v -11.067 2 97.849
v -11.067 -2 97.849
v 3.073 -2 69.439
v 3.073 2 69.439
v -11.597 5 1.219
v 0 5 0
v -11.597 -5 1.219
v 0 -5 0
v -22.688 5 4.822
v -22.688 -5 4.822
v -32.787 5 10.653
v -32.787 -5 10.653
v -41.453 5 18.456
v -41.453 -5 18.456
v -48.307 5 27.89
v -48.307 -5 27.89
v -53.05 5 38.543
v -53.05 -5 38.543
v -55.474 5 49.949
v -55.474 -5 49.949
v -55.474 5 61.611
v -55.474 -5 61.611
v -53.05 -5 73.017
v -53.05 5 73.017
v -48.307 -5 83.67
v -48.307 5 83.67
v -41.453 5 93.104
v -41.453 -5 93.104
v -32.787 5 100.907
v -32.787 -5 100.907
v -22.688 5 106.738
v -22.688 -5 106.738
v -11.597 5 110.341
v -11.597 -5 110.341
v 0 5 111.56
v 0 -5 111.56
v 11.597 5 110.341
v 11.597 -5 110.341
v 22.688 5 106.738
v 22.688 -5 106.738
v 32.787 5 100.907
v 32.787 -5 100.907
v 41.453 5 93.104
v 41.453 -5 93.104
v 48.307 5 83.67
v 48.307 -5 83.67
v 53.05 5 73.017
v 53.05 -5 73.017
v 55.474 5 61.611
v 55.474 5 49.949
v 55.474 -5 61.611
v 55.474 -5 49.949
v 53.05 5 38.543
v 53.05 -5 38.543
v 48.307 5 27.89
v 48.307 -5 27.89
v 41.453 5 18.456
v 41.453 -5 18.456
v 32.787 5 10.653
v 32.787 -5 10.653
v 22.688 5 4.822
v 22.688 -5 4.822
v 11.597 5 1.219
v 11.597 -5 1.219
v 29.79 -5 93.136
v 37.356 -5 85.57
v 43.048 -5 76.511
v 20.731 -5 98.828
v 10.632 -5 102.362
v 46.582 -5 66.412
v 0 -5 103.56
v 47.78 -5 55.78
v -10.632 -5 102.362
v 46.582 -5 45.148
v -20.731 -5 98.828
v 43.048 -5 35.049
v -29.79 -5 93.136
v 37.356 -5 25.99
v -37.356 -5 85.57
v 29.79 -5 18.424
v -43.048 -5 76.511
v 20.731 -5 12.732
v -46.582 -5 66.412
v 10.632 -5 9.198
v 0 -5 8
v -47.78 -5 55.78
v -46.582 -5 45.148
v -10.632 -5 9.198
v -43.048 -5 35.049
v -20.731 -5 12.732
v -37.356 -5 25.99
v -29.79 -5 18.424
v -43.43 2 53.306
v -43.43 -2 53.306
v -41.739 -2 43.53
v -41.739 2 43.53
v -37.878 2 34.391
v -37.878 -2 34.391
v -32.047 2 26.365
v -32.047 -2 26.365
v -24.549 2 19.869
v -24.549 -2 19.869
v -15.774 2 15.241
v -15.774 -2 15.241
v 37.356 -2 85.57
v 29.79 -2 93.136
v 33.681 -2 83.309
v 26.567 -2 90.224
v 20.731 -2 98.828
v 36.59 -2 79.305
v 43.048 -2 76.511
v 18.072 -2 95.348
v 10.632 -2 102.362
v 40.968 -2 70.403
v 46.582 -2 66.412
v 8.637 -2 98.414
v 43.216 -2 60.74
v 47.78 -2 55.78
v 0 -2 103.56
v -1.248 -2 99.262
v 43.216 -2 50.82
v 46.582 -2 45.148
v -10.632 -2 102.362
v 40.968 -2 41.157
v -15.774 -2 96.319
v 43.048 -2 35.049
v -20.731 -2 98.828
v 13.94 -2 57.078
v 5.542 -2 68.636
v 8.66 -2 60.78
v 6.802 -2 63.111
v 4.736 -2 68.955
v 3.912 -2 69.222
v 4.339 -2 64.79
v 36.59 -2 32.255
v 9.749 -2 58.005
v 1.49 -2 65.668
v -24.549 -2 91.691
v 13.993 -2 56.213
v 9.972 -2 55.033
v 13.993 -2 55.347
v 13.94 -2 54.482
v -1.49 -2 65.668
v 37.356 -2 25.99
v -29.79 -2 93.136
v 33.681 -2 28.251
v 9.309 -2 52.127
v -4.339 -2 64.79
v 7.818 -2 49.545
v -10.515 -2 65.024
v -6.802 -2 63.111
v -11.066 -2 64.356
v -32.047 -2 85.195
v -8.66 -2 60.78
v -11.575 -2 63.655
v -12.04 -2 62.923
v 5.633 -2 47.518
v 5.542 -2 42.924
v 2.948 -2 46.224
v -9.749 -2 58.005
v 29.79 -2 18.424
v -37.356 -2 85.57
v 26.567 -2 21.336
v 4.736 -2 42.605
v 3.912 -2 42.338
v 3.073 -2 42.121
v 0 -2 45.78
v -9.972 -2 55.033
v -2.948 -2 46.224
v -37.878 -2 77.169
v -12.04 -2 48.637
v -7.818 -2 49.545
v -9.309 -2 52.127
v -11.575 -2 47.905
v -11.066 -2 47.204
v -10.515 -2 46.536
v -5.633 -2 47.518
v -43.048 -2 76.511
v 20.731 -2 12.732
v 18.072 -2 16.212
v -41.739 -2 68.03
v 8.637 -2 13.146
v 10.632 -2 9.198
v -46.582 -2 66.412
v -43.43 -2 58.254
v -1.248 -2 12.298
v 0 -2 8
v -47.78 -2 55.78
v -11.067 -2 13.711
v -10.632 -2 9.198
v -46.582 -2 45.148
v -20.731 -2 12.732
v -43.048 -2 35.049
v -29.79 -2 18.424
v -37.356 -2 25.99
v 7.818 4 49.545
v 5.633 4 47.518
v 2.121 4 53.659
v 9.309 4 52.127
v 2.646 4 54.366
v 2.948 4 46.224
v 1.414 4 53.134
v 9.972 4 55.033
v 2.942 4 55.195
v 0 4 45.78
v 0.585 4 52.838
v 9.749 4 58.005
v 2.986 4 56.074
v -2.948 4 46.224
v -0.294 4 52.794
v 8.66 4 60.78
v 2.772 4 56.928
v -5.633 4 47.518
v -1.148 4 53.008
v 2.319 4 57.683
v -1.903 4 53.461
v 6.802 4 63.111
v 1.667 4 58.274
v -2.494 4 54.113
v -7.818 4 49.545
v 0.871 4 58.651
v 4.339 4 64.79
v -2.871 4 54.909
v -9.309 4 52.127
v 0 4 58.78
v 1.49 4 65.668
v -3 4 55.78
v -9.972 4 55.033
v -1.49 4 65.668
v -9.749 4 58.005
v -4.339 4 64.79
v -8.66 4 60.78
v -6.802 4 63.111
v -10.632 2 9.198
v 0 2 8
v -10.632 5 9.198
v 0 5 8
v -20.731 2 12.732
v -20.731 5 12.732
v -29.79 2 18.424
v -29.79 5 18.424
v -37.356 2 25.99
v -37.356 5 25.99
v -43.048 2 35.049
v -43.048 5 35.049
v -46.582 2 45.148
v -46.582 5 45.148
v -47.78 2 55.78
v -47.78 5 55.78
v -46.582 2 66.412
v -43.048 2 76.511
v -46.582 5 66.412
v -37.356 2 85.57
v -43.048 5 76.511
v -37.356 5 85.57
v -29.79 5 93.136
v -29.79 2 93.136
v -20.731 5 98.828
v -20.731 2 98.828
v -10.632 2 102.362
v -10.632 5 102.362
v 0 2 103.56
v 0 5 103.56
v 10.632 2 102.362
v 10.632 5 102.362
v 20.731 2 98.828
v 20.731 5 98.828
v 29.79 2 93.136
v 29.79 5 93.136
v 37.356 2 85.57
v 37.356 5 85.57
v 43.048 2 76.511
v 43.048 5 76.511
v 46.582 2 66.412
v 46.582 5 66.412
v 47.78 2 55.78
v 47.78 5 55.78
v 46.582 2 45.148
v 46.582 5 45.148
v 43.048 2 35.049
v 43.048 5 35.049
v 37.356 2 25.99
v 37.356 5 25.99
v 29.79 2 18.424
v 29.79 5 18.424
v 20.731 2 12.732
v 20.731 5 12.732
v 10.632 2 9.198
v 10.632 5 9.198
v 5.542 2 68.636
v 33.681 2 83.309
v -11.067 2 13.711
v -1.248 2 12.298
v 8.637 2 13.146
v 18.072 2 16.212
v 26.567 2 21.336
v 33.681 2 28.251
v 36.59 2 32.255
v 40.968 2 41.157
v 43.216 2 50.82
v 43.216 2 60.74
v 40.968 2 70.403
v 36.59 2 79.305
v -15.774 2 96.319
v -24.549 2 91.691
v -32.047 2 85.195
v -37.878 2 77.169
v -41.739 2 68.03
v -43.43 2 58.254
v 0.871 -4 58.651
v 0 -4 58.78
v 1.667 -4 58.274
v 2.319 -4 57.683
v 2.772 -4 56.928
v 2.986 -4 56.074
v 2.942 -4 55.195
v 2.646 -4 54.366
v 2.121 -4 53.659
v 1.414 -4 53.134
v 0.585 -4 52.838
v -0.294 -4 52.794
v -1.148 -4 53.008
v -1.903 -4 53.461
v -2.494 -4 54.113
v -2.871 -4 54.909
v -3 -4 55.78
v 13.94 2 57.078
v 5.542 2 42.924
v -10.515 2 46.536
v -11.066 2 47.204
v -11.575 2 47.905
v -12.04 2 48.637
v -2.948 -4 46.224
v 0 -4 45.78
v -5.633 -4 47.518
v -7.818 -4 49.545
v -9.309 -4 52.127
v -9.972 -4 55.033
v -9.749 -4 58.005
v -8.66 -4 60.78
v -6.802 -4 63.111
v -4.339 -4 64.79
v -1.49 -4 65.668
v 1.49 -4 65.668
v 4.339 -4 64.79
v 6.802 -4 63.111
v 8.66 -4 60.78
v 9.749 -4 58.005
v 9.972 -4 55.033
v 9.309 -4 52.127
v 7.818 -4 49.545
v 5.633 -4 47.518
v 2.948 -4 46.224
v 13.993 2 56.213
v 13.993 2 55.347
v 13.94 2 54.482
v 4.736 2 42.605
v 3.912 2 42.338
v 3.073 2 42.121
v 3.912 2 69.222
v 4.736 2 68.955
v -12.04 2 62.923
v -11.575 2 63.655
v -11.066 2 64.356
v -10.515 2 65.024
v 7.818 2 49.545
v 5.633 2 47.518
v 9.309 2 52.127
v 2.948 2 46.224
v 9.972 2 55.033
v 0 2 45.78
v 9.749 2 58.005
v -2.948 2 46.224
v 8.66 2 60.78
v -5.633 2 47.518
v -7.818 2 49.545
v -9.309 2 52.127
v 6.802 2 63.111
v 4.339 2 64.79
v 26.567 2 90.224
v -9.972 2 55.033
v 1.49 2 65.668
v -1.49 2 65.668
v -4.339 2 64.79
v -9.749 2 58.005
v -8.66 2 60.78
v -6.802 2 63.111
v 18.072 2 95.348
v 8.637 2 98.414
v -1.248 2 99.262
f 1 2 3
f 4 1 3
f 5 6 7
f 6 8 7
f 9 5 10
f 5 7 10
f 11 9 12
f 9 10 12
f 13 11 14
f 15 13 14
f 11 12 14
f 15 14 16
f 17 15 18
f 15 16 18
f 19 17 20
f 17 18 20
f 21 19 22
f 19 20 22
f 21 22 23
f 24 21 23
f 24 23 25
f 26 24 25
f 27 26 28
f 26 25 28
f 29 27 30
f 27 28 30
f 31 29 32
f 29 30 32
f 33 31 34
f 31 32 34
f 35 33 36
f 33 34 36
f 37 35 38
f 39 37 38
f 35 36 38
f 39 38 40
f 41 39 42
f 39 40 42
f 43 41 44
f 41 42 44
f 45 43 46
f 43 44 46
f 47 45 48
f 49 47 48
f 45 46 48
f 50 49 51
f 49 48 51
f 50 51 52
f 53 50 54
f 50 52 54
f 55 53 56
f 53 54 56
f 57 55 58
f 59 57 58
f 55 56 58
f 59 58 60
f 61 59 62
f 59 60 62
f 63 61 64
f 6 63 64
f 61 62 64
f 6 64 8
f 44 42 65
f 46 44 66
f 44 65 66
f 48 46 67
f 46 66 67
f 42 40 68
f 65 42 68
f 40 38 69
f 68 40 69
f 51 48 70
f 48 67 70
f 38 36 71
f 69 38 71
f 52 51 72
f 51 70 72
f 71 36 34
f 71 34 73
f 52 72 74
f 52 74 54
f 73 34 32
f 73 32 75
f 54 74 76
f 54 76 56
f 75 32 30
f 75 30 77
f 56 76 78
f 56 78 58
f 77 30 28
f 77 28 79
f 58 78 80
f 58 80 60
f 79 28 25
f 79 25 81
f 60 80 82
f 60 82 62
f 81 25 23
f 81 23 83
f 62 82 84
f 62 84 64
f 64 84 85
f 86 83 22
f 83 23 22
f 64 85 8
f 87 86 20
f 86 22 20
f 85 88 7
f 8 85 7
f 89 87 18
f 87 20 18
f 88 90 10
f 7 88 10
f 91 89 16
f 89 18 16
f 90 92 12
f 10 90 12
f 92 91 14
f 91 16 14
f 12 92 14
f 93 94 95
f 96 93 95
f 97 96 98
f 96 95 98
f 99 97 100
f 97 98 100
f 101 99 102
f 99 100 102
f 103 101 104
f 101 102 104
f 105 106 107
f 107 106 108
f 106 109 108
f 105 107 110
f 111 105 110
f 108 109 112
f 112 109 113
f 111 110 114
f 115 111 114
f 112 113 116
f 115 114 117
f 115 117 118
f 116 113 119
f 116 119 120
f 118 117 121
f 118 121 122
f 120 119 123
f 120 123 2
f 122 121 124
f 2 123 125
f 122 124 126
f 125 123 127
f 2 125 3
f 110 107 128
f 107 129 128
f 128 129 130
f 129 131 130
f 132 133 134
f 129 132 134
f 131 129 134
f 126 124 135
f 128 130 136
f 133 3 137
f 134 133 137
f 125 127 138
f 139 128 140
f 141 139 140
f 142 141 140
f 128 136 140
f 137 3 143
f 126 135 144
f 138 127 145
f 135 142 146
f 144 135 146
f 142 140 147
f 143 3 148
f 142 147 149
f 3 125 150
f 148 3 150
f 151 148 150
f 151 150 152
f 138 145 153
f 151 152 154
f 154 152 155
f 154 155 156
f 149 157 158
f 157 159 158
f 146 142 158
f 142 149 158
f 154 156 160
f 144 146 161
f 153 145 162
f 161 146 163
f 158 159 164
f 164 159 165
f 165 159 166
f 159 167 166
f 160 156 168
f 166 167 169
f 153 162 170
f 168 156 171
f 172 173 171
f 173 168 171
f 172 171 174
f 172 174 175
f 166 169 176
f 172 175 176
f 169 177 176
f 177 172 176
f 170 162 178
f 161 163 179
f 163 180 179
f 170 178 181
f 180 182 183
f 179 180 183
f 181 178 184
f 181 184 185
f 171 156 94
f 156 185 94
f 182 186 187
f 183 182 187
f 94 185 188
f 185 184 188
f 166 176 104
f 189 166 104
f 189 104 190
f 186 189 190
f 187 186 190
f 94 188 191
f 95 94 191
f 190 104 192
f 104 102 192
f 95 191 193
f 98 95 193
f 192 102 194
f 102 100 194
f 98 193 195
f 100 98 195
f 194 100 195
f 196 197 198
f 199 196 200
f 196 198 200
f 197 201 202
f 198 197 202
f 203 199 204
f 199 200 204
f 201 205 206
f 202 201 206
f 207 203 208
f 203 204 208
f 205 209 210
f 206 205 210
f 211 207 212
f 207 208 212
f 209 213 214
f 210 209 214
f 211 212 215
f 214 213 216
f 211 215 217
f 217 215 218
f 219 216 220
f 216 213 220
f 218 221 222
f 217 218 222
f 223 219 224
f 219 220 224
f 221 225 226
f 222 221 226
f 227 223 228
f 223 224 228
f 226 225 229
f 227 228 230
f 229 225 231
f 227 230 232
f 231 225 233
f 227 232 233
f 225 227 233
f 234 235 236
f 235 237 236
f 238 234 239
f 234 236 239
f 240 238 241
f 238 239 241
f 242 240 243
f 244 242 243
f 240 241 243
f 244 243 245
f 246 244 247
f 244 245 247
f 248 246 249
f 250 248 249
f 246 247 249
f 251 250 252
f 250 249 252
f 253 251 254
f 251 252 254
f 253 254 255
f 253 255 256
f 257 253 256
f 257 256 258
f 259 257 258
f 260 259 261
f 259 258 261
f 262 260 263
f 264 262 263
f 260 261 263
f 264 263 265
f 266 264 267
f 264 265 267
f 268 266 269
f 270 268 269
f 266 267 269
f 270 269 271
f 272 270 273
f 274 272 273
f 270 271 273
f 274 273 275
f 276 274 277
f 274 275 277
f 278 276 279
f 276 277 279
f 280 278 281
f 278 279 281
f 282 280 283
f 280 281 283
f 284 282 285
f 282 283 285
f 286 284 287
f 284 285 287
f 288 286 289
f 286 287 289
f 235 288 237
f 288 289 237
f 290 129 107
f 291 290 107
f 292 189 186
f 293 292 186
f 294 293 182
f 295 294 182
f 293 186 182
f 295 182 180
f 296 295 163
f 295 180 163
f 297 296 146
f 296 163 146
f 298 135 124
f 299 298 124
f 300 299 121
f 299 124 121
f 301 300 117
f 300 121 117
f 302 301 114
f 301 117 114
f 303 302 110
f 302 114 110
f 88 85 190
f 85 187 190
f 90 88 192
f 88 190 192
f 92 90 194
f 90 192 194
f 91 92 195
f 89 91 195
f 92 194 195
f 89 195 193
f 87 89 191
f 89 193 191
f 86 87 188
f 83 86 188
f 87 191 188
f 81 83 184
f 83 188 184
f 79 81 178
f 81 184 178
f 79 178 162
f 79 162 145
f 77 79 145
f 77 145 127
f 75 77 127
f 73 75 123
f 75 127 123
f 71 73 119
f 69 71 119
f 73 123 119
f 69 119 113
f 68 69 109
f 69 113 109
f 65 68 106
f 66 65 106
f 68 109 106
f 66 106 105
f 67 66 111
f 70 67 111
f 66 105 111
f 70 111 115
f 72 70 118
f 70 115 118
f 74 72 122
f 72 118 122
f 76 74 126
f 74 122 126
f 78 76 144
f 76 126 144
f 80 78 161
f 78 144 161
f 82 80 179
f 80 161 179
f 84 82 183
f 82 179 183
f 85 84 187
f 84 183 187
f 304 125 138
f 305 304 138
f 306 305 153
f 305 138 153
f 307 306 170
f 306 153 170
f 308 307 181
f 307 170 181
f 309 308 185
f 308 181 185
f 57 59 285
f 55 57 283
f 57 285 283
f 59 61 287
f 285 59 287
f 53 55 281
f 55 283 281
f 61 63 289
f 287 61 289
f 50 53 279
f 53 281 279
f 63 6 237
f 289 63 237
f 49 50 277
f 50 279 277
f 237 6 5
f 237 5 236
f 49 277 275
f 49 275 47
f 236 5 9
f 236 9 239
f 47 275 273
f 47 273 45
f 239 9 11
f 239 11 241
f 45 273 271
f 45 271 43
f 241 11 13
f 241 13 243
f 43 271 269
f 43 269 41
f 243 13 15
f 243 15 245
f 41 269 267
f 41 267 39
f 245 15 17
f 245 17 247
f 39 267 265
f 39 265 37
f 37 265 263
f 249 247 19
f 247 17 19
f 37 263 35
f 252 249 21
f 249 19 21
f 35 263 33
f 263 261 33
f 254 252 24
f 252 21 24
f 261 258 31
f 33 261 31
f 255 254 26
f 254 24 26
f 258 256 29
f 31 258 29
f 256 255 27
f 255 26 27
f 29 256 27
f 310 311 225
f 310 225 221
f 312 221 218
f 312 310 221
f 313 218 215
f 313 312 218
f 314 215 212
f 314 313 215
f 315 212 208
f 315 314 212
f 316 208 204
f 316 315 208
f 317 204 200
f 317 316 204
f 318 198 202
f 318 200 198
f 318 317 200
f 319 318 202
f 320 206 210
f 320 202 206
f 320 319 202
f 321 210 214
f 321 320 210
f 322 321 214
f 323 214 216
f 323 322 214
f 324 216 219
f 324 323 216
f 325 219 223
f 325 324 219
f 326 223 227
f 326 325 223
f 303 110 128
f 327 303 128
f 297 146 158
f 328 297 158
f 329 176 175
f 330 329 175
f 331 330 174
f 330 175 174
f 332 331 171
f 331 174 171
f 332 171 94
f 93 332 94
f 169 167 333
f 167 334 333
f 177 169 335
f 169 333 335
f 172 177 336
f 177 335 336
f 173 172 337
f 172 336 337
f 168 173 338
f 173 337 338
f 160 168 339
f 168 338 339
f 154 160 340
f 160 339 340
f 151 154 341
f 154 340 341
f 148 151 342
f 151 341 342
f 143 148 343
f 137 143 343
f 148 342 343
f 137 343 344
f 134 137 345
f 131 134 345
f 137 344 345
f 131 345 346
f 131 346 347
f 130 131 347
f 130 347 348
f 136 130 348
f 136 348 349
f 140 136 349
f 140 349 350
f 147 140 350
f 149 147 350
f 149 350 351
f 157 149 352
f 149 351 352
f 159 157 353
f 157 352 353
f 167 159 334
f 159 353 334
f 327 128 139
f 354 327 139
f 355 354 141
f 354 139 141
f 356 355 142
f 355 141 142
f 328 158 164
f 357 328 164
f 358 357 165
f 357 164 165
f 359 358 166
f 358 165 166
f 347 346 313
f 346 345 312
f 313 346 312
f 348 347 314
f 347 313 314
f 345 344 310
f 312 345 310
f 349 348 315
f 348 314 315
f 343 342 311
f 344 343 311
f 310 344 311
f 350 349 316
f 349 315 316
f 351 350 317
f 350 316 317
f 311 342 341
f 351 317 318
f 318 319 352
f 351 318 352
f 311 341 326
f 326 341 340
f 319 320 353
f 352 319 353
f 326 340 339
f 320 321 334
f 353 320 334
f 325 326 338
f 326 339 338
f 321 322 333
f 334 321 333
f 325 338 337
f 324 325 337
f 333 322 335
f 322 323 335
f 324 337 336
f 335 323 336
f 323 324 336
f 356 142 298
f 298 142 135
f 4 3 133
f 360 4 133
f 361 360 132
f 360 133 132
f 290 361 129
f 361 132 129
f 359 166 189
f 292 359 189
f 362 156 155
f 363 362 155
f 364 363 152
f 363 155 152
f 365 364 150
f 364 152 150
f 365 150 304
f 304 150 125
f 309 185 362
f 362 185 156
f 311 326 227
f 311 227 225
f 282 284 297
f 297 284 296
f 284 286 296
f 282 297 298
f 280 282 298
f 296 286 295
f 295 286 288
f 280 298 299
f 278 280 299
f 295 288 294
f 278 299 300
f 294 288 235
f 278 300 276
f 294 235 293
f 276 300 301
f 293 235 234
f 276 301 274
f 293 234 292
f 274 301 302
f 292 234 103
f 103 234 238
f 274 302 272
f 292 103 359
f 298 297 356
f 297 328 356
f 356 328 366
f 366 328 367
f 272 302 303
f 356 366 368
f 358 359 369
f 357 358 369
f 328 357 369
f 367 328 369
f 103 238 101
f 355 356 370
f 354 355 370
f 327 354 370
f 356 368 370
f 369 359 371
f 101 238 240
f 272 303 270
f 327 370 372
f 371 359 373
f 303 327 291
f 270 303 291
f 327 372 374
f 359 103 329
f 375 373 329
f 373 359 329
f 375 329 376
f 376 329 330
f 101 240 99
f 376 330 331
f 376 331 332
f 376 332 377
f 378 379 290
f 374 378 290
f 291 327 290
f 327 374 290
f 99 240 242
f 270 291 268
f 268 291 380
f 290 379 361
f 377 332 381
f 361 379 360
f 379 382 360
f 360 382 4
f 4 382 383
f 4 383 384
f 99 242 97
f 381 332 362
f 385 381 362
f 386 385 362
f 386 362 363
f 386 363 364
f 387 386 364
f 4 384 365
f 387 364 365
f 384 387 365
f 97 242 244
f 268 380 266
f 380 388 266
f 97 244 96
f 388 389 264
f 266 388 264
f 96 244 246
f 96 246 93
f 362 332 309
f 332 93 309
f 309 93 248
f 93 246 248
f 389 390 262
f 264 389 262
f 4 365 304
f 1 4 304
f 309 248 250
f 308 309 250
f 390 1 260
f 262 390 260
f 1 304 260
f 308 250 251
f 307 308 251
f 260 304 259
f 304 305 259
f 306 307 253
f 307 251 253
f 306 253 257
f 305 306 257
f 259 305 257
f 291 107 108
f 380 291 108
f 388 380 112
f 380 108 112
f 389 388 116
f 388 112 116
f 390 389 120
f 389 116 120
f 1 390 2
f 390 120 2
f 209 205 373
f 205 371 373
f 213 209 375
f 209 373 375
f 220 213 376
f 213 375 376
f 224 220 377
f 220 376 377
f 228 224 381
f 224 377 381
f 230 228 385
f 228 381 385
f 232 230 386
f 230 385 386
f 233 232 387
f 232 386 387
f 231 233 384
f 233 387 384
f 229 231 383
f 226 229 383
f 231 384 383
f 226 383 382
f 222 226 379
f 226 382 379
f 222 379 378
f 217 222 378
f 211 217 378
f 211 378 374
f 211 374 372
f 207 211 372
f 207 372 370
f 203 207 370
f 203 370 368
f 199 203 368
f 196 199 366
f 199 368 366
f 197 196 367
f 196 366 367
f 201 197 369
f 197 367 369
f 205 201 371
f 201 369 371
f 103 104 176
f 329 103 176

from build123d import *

# Parameters (mm, degrees)
CUT_EXTRUDE1_DEPTH = 10
CUT_EXTRUDE3_DEPTH = 10


with BuildPart() as part:
    # Sketch2 → Revolve1 (revolve)
    with BuildSketch(Plane(origin=(0, 0, 0), x_dir=(0, 0, -1), z_dir=(1, 0, 0))):
        Polygon((-55.78, -4), (-55.78, 4), (-45.78, 4), (-45.78, 2), (-8, 2), (-8, 5), (0, 5), (0, -5), (-8, -5), (-8, -2), (-45.78, -2), (-45.78, -4), align=None)
    revolve(axis=Axis((0, -4, 55.78), (0, 1, 0)))

    # Sketch5 → Cut-Extrude1 (cut)
    with BuildSketch(Plane.XZ.offset(4)):
        with BuildLine():
            Line((-3, 55.78), (0, 58.78))
            ThreePointArc((0, 58.78), (2.121320344, 53.658679656), (-3, 55.78))
        make_face()
    extrude(amount=-CUT_EXTRUDE1_DEPTH, mode=Mode.SUBTRACT)

    # Sketch6 → Cut-Extrude3 (cut)
    with BuildSketch(Plane(origin=(0, -2, 0), x_dir=(-1, 0, 0), z_dir=(0, -1, 0))):
        with BuildLine():
            Line((12.040379463, -48.636523088), (43.429568931, -53.305622821))
            ThreePointArc((43.429568931, -53.305622821), (35.192239255, -30.211341525), (15.773747398, -15.240650067))
            Line((15.773747398, -15.240650067), (10.514532139, -46.536374418))
            ThreePointArc((10.514532139, -46.536374418), (11.326237921, -47.551006468), (12.040379463, -48.636523088))
        make_face()
        with BuildLine():
            ThreePointArc((15.773747398, -96.319349933), (35.192239255, -81.348658475), (43.429568931, -58.254377179))
            Line((43.429568931, -58.254377179), (12.040379463, -62.923476912))
            ThreePointArc((12.040379463, -62.923476912), (11.326237921, -64.008993532), (10.514532139, -65.023625582))
            Line((10.514532139, -65.023625582), (15.773747398, -96.319349933))
        make_face()
        with BuildLine():
            ThreePointArc((-33.680856909, -83.30907332), (-13.442239255, -97.150958459), (11.067202318, -97.848599131))
            Line((11.067202318, -97.848599131), (-3.073168394, -69.438537111))
            ThreePointArc((-3.073168394, -69.438537111), (-4.326237921, -69.094791228), (-5.542041225, -68.636351701))
            Line((-5.542041225, -68.636351701), (-33.680856909, -83.30907332))
        make_face()
        with BuildLine():
            ThreePointArc((-36.589661739, -32.254553057), (-43.5, -55.78), (-36.589661739, -79.305446943))
            Line((-36.589661739, -79.305446943), (-13.939701983, -57.077963259))
            ThreePointArc((-13.939701983, -57.077963259), (-14, -55.78), (-13.939701983, -54.482036741))
            Line((-13.939701983, -54.482036741), (-36.589661739, -32.254553057))
        make_face()
        with BuildLine():
            Line((-3.073168394, -42.121462889), (11.067202318, -13.711400869))
            ThreePointArc((11.067202318, -13.711400869), (-13.442239255, -14.409041541), (-33.680856909, -28.25092668))
            Line((-33.680856909, -28.25092668), (-5.542041225, -42.923648299))
            ThreePointArc((-5.542041225, -42.923648299), (-4.326237921, -42.465208772), (-3.073168394, -42.121462889))
        make_face()
    extrude(amount=-CUT_EXTRUDE3_DEPTH, mode=Mode.SUBTRACT)


solid = part.part
